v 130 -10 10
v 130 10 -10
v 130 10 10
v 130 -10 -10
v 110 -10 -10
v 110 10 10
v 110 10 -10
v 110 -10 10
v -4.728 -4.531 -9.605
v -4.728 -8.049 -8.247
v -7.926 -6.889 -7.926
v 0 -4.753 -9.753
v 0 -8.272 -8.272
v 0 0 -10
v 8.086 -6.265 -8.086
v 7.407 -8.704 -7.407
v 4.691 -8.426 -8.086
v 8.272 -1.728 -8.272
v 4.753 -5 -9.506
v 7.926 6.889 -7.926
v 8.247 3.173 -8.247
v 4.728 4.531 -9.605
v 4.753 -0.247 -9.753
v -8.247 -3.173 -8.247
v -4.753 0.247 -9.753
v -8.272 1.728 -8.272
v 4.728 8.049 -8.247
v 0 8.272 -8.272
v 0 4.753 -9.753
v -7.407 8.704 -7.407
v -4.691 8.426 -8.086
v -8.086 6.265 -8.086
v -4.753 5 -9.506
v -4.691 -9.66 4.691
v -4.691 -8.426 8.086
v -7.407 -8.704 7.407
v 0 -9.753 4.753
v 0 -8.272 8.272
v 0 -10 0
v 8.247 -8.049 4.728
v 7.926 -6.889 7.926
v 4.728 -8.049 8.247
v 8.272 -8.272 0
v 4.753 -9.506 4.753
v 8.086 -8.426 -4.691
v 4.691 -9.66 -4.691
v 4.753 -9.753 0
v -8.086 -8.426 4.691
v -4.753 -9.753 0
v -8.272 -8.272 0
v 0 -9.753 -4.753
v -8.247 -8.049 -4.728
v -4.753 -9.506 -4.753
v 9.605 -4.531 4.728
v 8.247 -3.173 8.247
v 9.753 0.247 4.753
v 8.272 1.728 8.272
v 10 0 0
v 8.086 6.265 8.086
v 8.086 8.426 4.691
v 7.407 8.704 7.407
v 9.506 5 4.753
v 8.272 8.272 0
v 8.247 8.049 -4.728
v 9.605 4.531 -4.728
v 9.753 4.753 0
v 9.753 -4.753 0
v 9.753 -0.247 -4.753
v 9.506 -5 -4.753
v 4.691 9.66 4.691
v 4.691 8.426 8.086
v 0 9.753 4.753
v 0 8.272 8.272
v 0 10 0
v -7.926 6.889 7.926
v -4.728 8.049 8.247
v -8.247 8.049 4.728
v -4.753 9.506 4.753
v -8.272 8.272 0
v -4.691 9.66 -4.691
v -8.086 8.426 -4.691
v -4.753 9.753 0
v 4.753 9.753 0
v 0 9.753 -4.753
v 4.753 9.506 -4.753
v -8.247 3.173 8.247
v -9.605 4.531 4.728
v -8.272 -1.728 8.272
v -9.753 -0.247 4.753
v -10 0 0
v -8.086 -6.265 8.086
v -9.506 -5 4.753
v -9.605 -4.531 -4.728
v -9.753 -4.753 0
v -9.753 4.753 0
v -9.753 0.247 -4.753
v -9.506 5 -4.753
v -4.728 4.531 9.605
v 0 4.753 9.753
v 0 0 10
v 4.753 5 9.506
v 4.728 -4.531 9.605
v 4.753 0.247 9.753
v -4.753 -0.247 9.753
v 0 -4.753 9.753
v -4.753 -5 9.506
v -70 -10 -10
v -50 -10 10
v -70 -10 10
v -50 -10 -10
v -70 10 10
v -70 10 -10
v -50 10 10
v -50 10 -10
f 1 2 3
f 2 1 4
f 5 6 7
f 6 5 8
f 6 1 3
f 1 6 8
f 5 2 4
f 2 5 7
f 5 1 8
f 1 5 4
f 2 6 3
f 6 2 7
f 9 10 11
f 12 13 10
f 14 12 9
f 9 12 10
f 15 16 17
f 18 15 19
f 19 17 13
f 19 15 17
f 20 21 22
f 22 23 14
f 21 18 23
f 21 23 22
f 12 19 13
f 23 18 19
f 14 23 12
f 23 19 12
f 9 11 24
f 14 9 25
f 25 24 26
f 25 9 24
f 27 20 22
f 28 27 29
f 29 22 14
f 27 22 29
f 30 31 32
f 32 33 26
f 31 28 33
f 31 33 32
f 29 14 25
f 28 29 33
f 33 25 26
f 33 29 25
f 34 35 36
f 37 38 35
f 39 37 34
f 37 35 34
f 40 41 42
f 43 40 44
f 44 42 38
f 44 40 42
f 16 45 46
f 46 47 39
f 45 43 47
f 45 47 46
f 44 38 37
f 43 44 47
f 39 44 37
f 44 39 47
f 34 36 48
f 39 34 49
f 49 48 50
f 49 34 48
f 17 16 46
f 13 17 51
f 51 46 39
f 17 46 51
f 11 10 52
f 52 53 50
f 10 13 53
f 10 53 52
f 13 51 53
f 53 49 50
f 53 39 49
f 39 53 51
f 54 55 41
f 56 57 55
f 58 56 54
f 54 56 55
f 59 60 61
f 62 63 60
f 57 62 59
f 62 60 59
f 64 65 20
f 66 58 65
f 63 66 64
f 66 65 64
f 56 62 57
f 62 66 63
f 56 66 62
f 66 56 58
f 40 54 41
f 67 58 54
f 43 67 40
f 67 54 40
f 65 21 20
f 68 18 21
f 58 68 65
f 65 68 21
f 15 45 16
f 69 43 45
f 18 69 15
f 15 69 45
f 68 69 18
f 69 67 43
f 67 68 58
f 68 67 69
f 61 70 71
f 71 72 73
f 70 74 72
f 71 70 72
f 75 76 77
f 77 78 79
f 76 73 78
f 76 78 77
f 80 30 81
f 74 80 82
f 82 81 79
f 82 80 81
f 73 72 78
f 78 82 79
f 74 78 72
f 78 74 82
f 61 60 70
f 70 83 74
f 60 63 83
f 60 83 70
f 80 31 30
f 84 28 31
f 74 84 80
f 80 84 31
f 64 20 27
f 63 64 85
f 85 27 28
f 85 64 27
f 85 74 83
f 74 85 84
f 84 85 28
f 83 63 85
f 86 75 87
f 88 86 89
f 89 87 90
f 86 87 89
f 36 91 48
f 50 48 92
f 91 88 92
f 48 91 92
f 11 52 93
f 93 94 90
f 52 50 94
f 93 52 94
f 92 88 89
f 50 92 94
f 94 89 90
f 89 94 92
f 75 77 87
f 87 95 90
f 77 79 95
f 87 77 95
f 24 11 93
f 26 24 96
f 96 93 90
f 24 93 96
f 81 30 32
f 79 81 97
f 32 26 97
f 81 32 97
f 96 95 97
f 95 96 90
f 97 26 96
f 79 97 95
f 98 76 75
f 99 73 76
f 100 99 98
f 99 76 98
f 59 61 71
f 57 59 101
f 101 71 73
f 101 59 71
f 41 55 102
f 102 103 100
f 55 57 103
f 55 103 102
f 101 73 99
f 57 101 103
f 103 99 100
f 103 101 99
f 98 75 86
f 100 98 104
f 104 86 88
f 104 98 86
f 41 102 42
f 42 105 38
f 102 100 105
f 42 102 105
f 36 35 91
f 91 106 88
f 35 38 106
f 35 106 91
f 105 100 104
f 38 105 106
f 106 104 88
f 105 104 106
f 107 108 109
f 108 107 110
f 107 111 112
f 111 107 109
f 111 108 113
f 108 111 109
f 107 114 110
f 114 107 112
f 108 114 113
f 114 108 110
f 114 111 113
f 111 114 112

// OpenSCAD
//demo mesh
Flat_treshold=0.009;
  //mesh=trimesh(cubemesh4() );
mesh=trimesh(cubemesh3() );
  //  mesh= (diamond() );

 // mesh=fp_flip(bunny());

echo(len(  mesh[0]),len(mesh[1]));

midmesh =  ( tesselate(fusepoints(mesh),2)) ;
 dmaesh= fp_decimate( midmesh );
 //nm = fp_decimate (tesselate(dmaesh,0));


 newmesh=relax (midmesh);
translate ([120,0,0]) polyhedron(midmesh[0], midmesh[1]);

// translate ([60,0,0]) polyhedron(nm[0], nm[1]);
translate ([ 0,0,0]) polyhedron(newmesh[0], newmesh[1]);

translate ([-60,0,0]) polyhedron(dmaesh[0], dmaesh[1]);
  // for (i = [0: len(newmesh) - 1]) echo(newmesh[i]);
echo(len( midmesh[0]),len(dmaesh[0]));
echo(len( dmaesh[0]),len(dmaesh[0]));


function fp_decimate (m,i=0,changed=0 ,nn=0)=
let(points=m[0],faces=m[1],n=neighbours(m) )
i<len(points)-1?
let(
removies=[for(k=[0:max(0,len(n[i])-1)]) faces[n[i][k]]],
 r=flattness(m,removies) 
//, e=echo(i,"removies",removies,"flattness",r)
)

r<=Flat_treshold? 
let(
newm=fp_decimateinidex(m,i,removies),
newch=len(newm[0])==len(m[0])?changed:changed+1,
newi=len(newm[0])==len(m[0])?i  :i
)
fp_decimate (newm,newi,newch,n ) 
:fp_decimate (m,i+1,changed ,n)
:
changed>0?

 fp_decimate( m)
:
fusepoints(m)

;

/*needs change*/

function fp_decimateinidex(m,j,n)=
let( points=m[0],faces=m[1])
let(
removies=n,
newfaces=fp_removevertex(m,removies,j,alt=3),
r= flattness(m,newfaces),
h= flattness(m,removies)

) 
r<=h?
    let(nn=notneighboursofi (m,j),keepers= [for(k=[0:len(nn)-1]) faces[nn[k]]]
 //, e=echo("n",removies,"j",keepers)
)
    [points, concat(keepers,newfaces)]
    :
m
;
function fp_removevertex(m,removies,vertex,alt=0)=
let(points=m[0] )
let(

n= avrg([for(i=[0:max(0,len(removies)-1)])
p2n(  [points[removies[i][0]], points[removies[i][1]], points[removies[i][2]]])    ] ),


d= fp_tricylceb(removies,vertex),
c= fp_segorder(d),
e=fp_segcollapse(c),
g=shuffle(e,alt-round(rnd(2))),
f=fp_triangulate(m,g,n)
//,eco=echo( len(d),len(c))
)
 len(removies)>2&&len(c)==len(d)&&len(f)+2==len(removies)?f: removies 
;
function flattness(m,n)=

let(points=m[0],faces=m[1], 

normals=[for(i=[0:max(0,len(n)-1)])p2n(
 [
//let(e=echo("normals",n))
points[n[i][0]],
points[n[i][1]],
points[n[i][2]] 
])

],
ne=normeq(normals)



)  

ne
;


/*needs change*/

function newflattness(m)=

let(points=m[0],faces=m[1],

normals=[for(i=[0:max(0,len(m)-1)])p2n(m[i])

],
ne=normeq(normals)


) 
ne
;
function fp_glue(m)= let (
   hashed = fp_addhash(fp_flatten(m)), /*flatten and pair points with hash*/
   sorted = fp_hashQS(hashed),/*sort by hash*/
   unique = fp_unique(sorted),/*unique by hash*/
   newmesh = [fp_removehash(unique), fp_relink(unique, m)])/* combine to new mesh*/
 newmesh;
 function fusepoints(m) =
 let (
   privatetized = fp_privatetize(m), /* convert indexed polyhedron */
 newmesh= fp_glue(privatetized))
 newmesh;

 function fp_privatetize(m) = 
/* convert indexed polyhedron to vetrtex polygons with private vertex*/
 let (p = m[0], f = m[1], l = max(0,len(f) - 1))[
   for (i = [0: l])[     for (j = [0: len(f[i]) - 1]) p[f[i][j]]   ]];

 function fp_flatten(l) = [   for (a = l)     for (b = a) b ];
 
 function fp_addhash(m) = 
/*pair each point with a hash of the point*/
[   for (i = [0: len(m) - 1])[fp_encode(m[i]), m[i]] ];

 function fp_encode(v) =
 let (xseed = round(fp_rnd(1e8, -1e8, round(v.x * 1e6))),
   yseed = round(fp_rnd(1e8, -1e8, xseed + round(v.y * 1e6))),
   zseed = round(fp_rnd(1e8, -1e8, yseed + round(v.z * 1e6))),
   hash =   round(fp_rnd(1e8, -1e8, zseed)))
 hash;

 function fp_hashQS(arr) = !(len(arr) > 0) ? [] :
 let (pivot = arr[floor(len(arr) / 2)][0],
 lesser = [ for (y = [0: len(arr) - 1]) if (arr[y][0] < pivot) arr[y] ],
 equal = [ for (y = [0: len(arr) - 1]) if (arr[y][0] == pivot) arr[y] ],
 greater = [ for (y = [0: len(arr) - 1]) if (arr[y][0] > pivot) arr[y] ])
 concat(fp_hashQS(lesser), equal, fp_hashQS(greater));

 function fp_unique(m) = [   for (i = [0: len(m) - 1])     if (m[i] != m[i - 1]) m[i] ];

 function fp_rnd(a = 1, b = 0, s = []) = s == [] ? (rands(min(a, b), max(   a, b), 1)[0]) : (rands(min(a, b), max(a, b), 1, s)[0]); 

 function fp_removehash(m) = [   for (i = [0: len(m) - 1]) m[i][1] ];
 function fp_relink(p, f) =
/*convert polygons with private vertex to indexed by searching for hash matches  */
 let (l = len(f) - 1)[   for (i = [0: l])[     for (j = [0: len(f[i]) - 1]) search(fp_encode(f[i][j]), p)[0]] ];
 
 function fp_flip(w)=[w[0],[for(i=[0:len(w[1])-1])[w[1][i][0],w[1][i][2],w[1][i][1]]]];

function lerp(start, end, bias) = (end * bias + start * (1 - bias));

function relax(m, c =  2,nn=0) = 
let(points=m[0], faces=m[1], n=nn==0?neighbours(m):nn)
c > 0 ?
let(
midpoints = 
[ for (i = [0: len(faces) - 1]) avrg( 
[points[faces[i][0]], points[faces[i][1]], points[faces[i][2]]]
) ], 

points2 = [ for (i = [0: len(points) - 1]) len(
n[i]) > 0 ?  avrg([ for (j = [0: len(n[i]) - 1]) midpoints[ n[i] [j]]
 ])  : points[i] ])

relax([points2, faces]  , c - 1,n)
:
 [points, faces];

function neighbours (m)=let(points=m[0],faces=m[1]) [ for (i = [0: len(points) - 1])[ for (j = [0: len(faces) - 1])
 if (faces[j][0] == i || faces[j][1] == i || faces[j][2] == i || faces[j][3] == i) j] ];
function notneighbours (m)=let(points=m[0],faces=m[1]) [ for (i = [0: len(points) - 1])[ for (j = [0: len(faces) - 1])
 if ( (faces[j][0] != i && faces[j][1] != i && faces[j][2] != i && faces[j][3] != i)) j] ];
function neighboursofi (m,i)=let(points=m[0],faces=m[1])
  [ for (j = [0: len(faces) - 1])
 if (faces[j][0] == i || faces[j][1] == i || faces[j][2] == i || faces[j][3] == i) j] ;
function notneighboursofi (m,i)=let(points=m[0],faces=m[1])
  [ for (j = [0: len(faces) - 1])
 if ( (faces[j][0] != i && faces[j][1] != i && faces[j][2] != i && faces[j][3] != i)) j] ;
function addl(l, c = 0) = c < len(l) - 1 ? l[c] + addl(l, c + 1) : l[
 c];
function avrg(l) = len(l) > 1 ? addl(l) / (len(l)) : l;




function shuffle(b,l=1)=let(
c=concat( [for(i=[1:len(b)-1])b[i]],[b[0]]))
l>0?shuffle(c,l-1):c
;
function fp_tricylceb(b,p)=[for(i=[0:len(b)-1])fp_tricycle (b[i],p)];

function fp_tricycle(f,p)=
fp_is_equal(f[0],p)?
[f[1],f[2]]:
     let(f1=[f[1],f[2],f[0]])
    fp_is_equal(f1[0],p)?
        [f1[1],f1[2]]:
        let(f2=[f1[1],f1[2],f1[0]])
        fp_is_equal(f2[0],p)?[f2[1],f2[2]]:
        f;

function fp_triangulate(m,a,n ,count=0)=
let(points=m[0],faces=m[1])
count>len(a)?
a
:
len(a)<=3?
[[a[0],a[1],a[2]]]:
sign(dot(p2n([points[a[0]],points[a[1]],points[a[2]]  ]),n))>0?
let(b=concat([for(i=[2:len(a)-1])a[i]],[a[0]] )) 
concat([[a[0],a[1],a[2]]],fp_triangulate( m,shuffle(b,2),n )):fp_triangulate(m, shuffle(a,1),n,count+1 );

function fp_trimeshulate(a)=len(a)>3?let(b=concat([for(i=[2:len(a)-1])a[i]],[a[0]] )
) concat([[a[0],a[1],a[2]]],fp_trimeshulate(shuffle(b,2))):[[a[0],a[1],a[2]]];



 function fp_is_equal(a, b, d=1e-16) = (a==b) || (abs(a-b)<d) || (norm(a-b)<d);
    function flatten(l) = [ for (li = l, lij = li) lij ];

function rnd(a = 1, b = 0) = (rands(min(a, b), max(a, b), 1)[0]);

 function fp_segorder(n,acc=0,c=0)=c<=len(n)-1?let(newacc= (acc==0)?[n[0]]:let(lookfor= acc[0][0]) concat([for(i=[0:len(n)-1])if(fp_is_equal(lookfor,n[i][1])==true)n[i]],acc ))fp_segorder(n,newacc,c+1):acc;

function fp_segcollapse(n)=
[for(i=[0:len(n)-1])n[i][0]];

function normeq(pl) = 

let (list= [
 for (i = [0: len(pl) - 1],j = [0: len(pl) - 1])
 
 (-1 + dot(pl[i], pl[j])  )
   ]
,
sums = avrg(list) )
 
abs(sums)
 ;

function p2n4(p) =un(p2n(p0,p1,p3)+p2n(p3,p1,p2));
function p2n(p) =
let (pa=p[0], pb=p[1], pc=p[2],
u = pa - pb, v = pa - pc) un([u[1] * v[2] - u[2] * v[1], u[2] *
 v[0] - u[0] * v[2], u[0] * v[1] - u[1] * v[0]
]);
function un(v) = v / max(len3(v), 0.000001) * 1; // div by zero safe unit normal
function dot(v1, v2) = v1[0] * v2[0] + v1[1] * v2[1] + v1[2] * v2[2];
function addl(l, c = 0) = c < len(l) - 1 ? l[c] + addl(l, c + 1) : l[
 c];
function len3(v) = len(v) > 1 ? sqrt(addl([
 for (i = [0: len(v) - 1]) pow(v[i], 2)
])) : len(v) == 1 ? v[0] : v;

function  trimesh (t)=
let(
t1=t[1],
t2=fp_flatten([for(i=[0:len(t1)-1]) 
 (len( t1[i])==3)?[t1[i]]:[[t1[i][0],t1[i][1],t1[i][2]],[t1[i][0],t1[i][2],t1[i][3]]]     ] )
)[t[0],t2]
;
function tesselate(m,c=1)=
c>=1?
 let (
   pr = fp_privatetize(m), /* convert indexed polyhedron */

 subdv=fp_flatten([for(i=[0:max(0,len(pr)-1)])let(
pr01=lerp(pr[i][0],pr[i][1],0.5),
pr12=lerp(pr[i][1],pr[i][2],0.5),
pr20=lerp(pr[i][2],pr[i][0],0.5)
)[
[pr[i][0],pr01,pr20],
[pr[i][1],pr12,pr01],
[pr[i][2],pr20,pr12],
[pr01,pr12,pr20]

]
]),
 
  newmesh =   fp_glue(subdv)
)
tesselate(newmesh,c-1)
:

m;
 

module trender(t) {
 C0 = (un(rndc()) + [2, 0, 0]);
 C1 = (un(rndc()) + [2, 2, 0]);
 C2 = (un(rndc()) + [0, 2, 2]);
 for (i = [0: max(0, len(t[1]) - 1)]) {
 n = un(p2n(t[0][t[1][i][0]], t[0]
 [t[1][i][1]], t[0][t[1][i][
 2
 ]]));
 color(un((C0 * abs(n[0]) + C1 * abs(n[1]) + C2 * abs(n[2]) + [
 1, 1, 1
 ] * abs(n[2])) / 4)) polyhedron(t[0], [t[1][i]]);
 }
}
function rndc(a = 1, b = 0,seed) = [rnd(a, b,seed),
 rnd(a, b,seed+1), rnd(a, b,seed+2)
];
function bunny()=[[[33.718,-8.247,33.616],[-30.065,-22.111,41.454],[1.142,14.457,35.998],[20.205,-17.34,49.075],[36.378,-2.827,7.022],[-11.251,13.5,5.136],[29.105,-18.728,7.239],[-9.845,8.083,9.951],[-36.86,-24.079,60.289],[-28.976,-3.302,3.436],[-11.413,-13.526,50.148],[28.736,-0.816,42.915],[-32.116,4.195,42.182],[29.812,-7.088,2.935],[-37.993,-15.409,34.838],[-28.78,-18.857,66.373],[-29.289,21.548,77.615],[-28.191,23.665,69.162],[-36.226,-11.242,66.87],[31.967,2.895,30.506],[-25.318,1.605,64.068],[-41.72,-13.563,47.396],[3.505,-27.667,8.246],[18.251,9.502,40.482],[-40.705,-8.309,57.649],[-34.759,-14.864,24.435],[41.326,-8.903,12.497],[7.937,-25.727,1.639],[0.142,18.861,18.906],[37.372,0.543,12.665],[11.469,-25.566,39.178],[-11.3,-25.322,6.98],[16.983,0.961,50.904],[25.417,10.084,22.882],[12.196,16.124,13.812],[-38.798,-23.136,44.566],[-6.906,16.568,23.283],[-11.406,5.707,70.997],[27.876,3.576,10.072],[-29.124,6.104,23.795],[30.252,-19.533,18.403],[-24.95,-3.186,68.402],[-21.5,4.288,1.733],[-20.217,0.035,59.846],[-16.111,-1.157,53.825],[9.791,18.388,28.806],[-20.449,-9.927,10.118],[-5.697,-29.44,3.937],[-14.075,-24.543,1.192],[-38.314,-4.065,30.749],[-17.348,-6.564,61.51],[39.723,-14.873,17.026],[-24.142,-11.883,1.318],[4.044,-18.973,49.654],[-25.128,-21.576,4.037],[28.884,-15.239,42.197],[-7.042,-23.574,16.146],[-22.782,1.057,13.904],[-30.957,-28.833,46.933],[-13.723,10.348,24.112],[-6.4,7,79.935],[0.38,8.58,73.547],[-2.751,-29.774,24.603],[32.871,-16.125,29.207],[-3.623,17.983,31.576],[17.513,4.686,2.883],[-30.017,-27.275,56.561],[13.323,-29.14,13.068],[-20.244,-21.378,18.476],[-20.735,-20.229,49.671],[34.577,-0.469,19.663],[-32.728,2.082,59.206],[1.448,8.004,45.899],[-21.1,-24.65,32.38],[-3.299,14.822,3.265],[37.681,-9.851,21.953],[10.732,-31.947,27.781],[-25.458,13.814,68.264],[14.963,11.754,4.948],[-21.548,-8.801,67.863],[2.005,-5.173,1.969],[-23.472,3.741,51.505],[21.968,-9.013,50.599],[-9.451,7.934,17.546],[41.184,-5.284,20.179],[-39.539,-2.907,46.751],[-39.019,-9.922,42.553],[-16.487,10.221,37.797],[-9.537,-0.368,72.53],[-13.553,-22.428,41.139],[-5.875,-25.824,33.532],[10.433,-17.548,2.653],[-40.968,-17.45,57.613],[-32.842,15.053,71.785],[-4.31,-4.034,51.575],[10.947,-7.696,54.207],[1.296,-30.04,33.917],[-33.833,1.324,66.787],[-27.494,-6.782,16.239],[-21.944,-17.558,61.153],[-38.475,-27.624,50.311],[24.879,-24.385,33.536],[-21.259,-16.919,7.059],[-21.259,-16.919,7.059],[-21.259,-16.919,7.059]],[[80,91,48],[27,48,91],[68,98,46],[48,52,80],[98,25,49],[54,52,48],[42,74,80],[52,42,80],[42,5,74],[6,13,26],[25,98,68],[9,42,52],[46,103,68],[58,35,1],[1,35,21],[80,74,65],[100,35,58],[80,65,13],[91,80,13],[27,91,6],[6,91,13],[47,48,27],[51,75,40],[87,59,39],[5,7,74],[2,72,23],[28,74,7],[54,104,52],[64,28,36],[60,61,37],[39,57,98],[64,45,28],[34,74,28],[31,48,47],[102,54,31],[7,42,57],[59,57,39],[12,81,87],[37,43,41],[2,45,64],[74,34,78],[41,43,20],[59,7,57],[28,45,34],[87,39,12],[45,33,34],[37,41,60],[12,71,81],[34,33,78],[72,2,87],[38,29,65],[65,29,4],[49,12,39],[50,79,99],[94,72,44],[23,11,19],[27,6,67],[72,81,44],[44,81,43],[87,81,72],[70,75,84],[43,81,20],[45,2,23],[29,70,84],[19,33,23],[33,45,23],[32,72,94],[83,7,59],[98,57,46],[57,9,46],[71,85,24],[97,71,24],[97,93,71],[85,12,49],[49,39,98],[9,57,42],[32,94,95],[23,72,32],[71,93,17],[18,24,92],[5,42,7],[86,1,21],[83,59,36],[83,36,7],[36,28,7],[64,36,59],[23,32,11],[93,16,17],[12,85,71],[18,8,15],[92,35,100],[87,2,59],[22,62,56],[9,52,46],[8,92,100],[90,62,96],[14,1,86],[93,97,16],[14,25,73],[25,68,73],[1,14,73],[16,77,17],[30,90,96],[2,64,59],[8,100,66],[77,71,17],[32,82,11],[41,79,60],[15,79,41],[3,55,82],[82,55,11],[10,94,44],[44,50,10],[20,77,16],[79,88,60],[20,71,77],[99,69,10],[21,92,24],[50,99,10],[16,41,20],[8,18,92],[97,41,16],[22,27,67],[51,84,75],[15,66,99],[97,18,41],[55,0,11],[4,26,13],[55,63,0],[70,38,33],[102,46,52],[14,49,25],[75,0,63],[74,78,65],[19,70,33],[38,65,78],[33,38,78],[86,85,49],[97,24,18],[65,4,13],[86,49,14],[70,29,38],[50,61,88],[6,26,51],[37,61,43],[30,76,101],[40,101,67],[101,76,67],[30,101,3],[101,40,63],[55,3,101],[40,75,63],[22,47,27],[67,6,40],[60,88,61],[43,50,44],[19,11,0],[63,55,101],[26,4,29],[84,26,29],[31,54,48],[69,99,66],[58,1,69],[69,66,58],[76,62,67],[3,53,30],[67,62,22],[43,61,50],[30,96,76],[96,62,76],[22,31,47],[53,89,30],[89,90,30],[95,3,82],[56,31,22],[95,53,3],[10,89,53],[90,56,62],[90,73,56],[40,6,51],[89,73,90],[21,85,86],[56,68,31],[0,75,70],[73,68,56],[69,89,10],[68,102,31],[84,51,26],[15,41,18],[89,69,1],[1,73,89],[92,21,35],[82,32,95],[24,85,21],[0,70,19],[71,20,81],[8,66,15],[79,50,88],[66,100,58],[94,53,95],[15,99,79],[10,53,94]]];


function diamond()=



[[[-4.10863, -0.140602, -3.6055], [-3.84601, -3.60175, -1.47346], [-3.97796, -4.24691, -0.613285], [-2.53813, -0.848251, -6.37256], [-2.18844, -1.82373, -4.13948], [-0.0333337, -0.848251, -6.37256], [-0.107152, -1.93214, -3.8401], [-1.97693, -1.14585, -5.02233], [-0.274562, -1.22818, -4.66476], [-3.44904, -3.49388, -1.8379], [-2.53813, -6.1872, 0.213072], [-0.037514, -3.74431, -1.36103], [1.90021, -5.55326, 1.49797], [-2.17048, -4.75789, 0.0422999], [0.38598, -5.22305, 0.760223], [-4.55809, -2.31577, -1.67114], [-6.44044, -0.0759498, -0.538324], [-6.32277, -1.73312, 0.916171], [-5.9166, -0.0467461, -1.88034], [-5.65828, -2.40612, -0.340622], [-6.96031, -0.89379, 0.448986], [-6.65543, -1.13852, -0.358017], [-2.88119, -2.59327, -3.09619], [-0.0989006, -2.70754, -2.83311], [-3.60055, -1.31693, -3.26812], [-2.53813, -2.6279, 0.213072], [-0.0333337, -0.848251, -1.98214], [-0.0333337, -2.6279, 0.213072], [2.15047, -1.95664, -3.656], [3.80216, -1.72573, -3.28922], [1.56304, -1.48258, -4.06836], [3.83668, -0.578218, -3.60172], [2.68802, -3.77158, -1.23882], [2.83805, -5.71606, 1.54781], [5.02919, -3.92323, -0.983753], [3.92337, -5.44133, 1.27551], [2.72541, -4.80807, 0.236576], [5.02994, -4.6583, 0.245474], [7.48106, -0.848251, -4.17735], [7.48106, -4.40755, -1.98214], [6.60705, -3.53789, 1.16426], [2.83029, -2.38095, -3.21484], [5.84927, -2.95745, -2.39152], [2.47146, -0.848251, -1.98214], [2.47146, -2.6279, 0.213072], [6.11744, -0.664958, -2.92074], [6.43254, -3.13239, -0.469602], [7.22257, -2.26381, -1.08929], [6.65182, -0.574654, -2.63706], [8.58868, -1.57387, 0.498089], [9.98586, -2.6279, 0.213072], [8.86667, -0.790335, 0.374336], [8.84603, -0.149826, 1.18825], [-4.87593, 1.50124, -3.97146], [-4.70862, 2.29828, -4.04328], [-2.53813, 0.931399, -6.37256], [-0.0333337, 0.931399, -6.37256], [-2.53813, 2.71105, -6.37256], [-1.92777, -0.992021, -5.03321], [-0.0333337, 2.71105, -6.37256], [-0.995141, 0.58903, -5.22706], [-2.83857, 2.64671, -4.83497], [-0.750299, 2.94568, -5.55327], [-4.06563, 3.93282, -3.18426], [-6.40319, 0.425744, -0.412854], [-5.75953, 0.527687, -2.25537], [-6.99193, 0.969201, 1.4556], [-5.02031, 3.91375, -2.41588], [-6.36916, 1.93535, 0.391189], [-7.54773, 2.71105, 0.213072], [-5.83043, 2.72602, -0.366366], [-0.0333337, 4.4907, -6.37256], [-2.95489, 4.38504, -3.58535], [-0.877111, 5.02743, -4.1213], [-2.53813, 6.27035, -4.17735], [-0.0333337, 6.27035, -4.17735], [-4.76143, 4.15636, -2.33779], [-4.16403, 4.15885, 0.111998], [-3.22708, 5.14215, -0.9632], [-1.14664, 5.60559, -1.71968], [-1.66131, 5.80306, -0.514935], [-2.62796, 5.5636, 0.410056], [-1.52977, 5.81804, -0.660227], [-0.446236, 5.67479, 0.418208], [-1.75275, 5.8585, -0.193377], [-1.41853, 5.85982, -0.269016], [-4.54762, -3.75071, 3.14745], [-3.71454, -3.78975, 3.72922], [-2.53813, -6.1872, 2.40828], [1.95471, -5.51812, 2.02936], [-1.98562, -4.49762, 2.43775], [0.605838, -5.10006, 2.73186], [-0.0333337, -6.1872, 4.60349], [-2.1796, -4.16354, 4.20972], [0.220772, -4.657, 5.04817], [-6.28168, -1.83123, 1.66813], [-5.33131, -3.05158, 3.25984], [-6.7583, -0.821015, 1.81635], [-6.00906, -0.691373, 3.23509], [-5.01305, -2.50056, 4.10666], [-7.54773, -0.848251, 4.60349], [-5.05032, -1.18996, 4.9624], [-2.53813, -2.6279, 2.40828], [-2.13919, -2.76434, 5.27905], [-0.478659, -3.32594, 5.65739], [-2.8572, -1.53707, 5.73698], [-0.0333337, -0.848251, 4.60349], [1.40225, -3.9013, 6.19035], [-5.04293, -0.848251, 6.7987], [-0.907379, -2.11602, 6.31779], [0.598011, -2.49364, 6.82502], [-1.09261, -1.85583, 6.29929], [0.925692, -0.912368, 6.68243], [2.47146, 2.71105, -6.37256], [1.57593, 0.832456, -4.50757], [3.86489, 1.76097, -4.05165], [1.83142, 2.49517, -4.66334], [3.50857, 2.16194, -4.07357], [7.48106, 0.931399, -4.17735], [7.48106, 2.71105, -4.17735], [0.927679, 4.60082, -3.54521], [4.97626, 4.4907, -4.17735], [5.60468, 1.48375, -3.48449], [3.02465, 3.60509, -3.20588], [4.69642, 3.79178, -2.32503], [4.97626, 2.71105, 0.213072], [7.28769, 1.33692, -2.80066], [7.10103, 3.30374, -1.62038], [8.91038, 0.594316, 0.471455], [8.79874, 0.177289, 1.19532], [7.25544, 3.28327, -1.09866], [9.98586, 2.71105, 0.213072], [2.38489, 4.5449, -2.73796], [4.94993, 4.02157, -1.7848], [2.47146, 6.27035, -1.98214], [2.25305, 5.13412, 1.26447], [5.98923, 4.14473, 0.694604], [2.47146, 6.27035, 0.213072], [4.97626, 6.27035, 0.213072], [6.10839, 3.74254, -1.03395], [6.44784, 3.85258, 0.124204], [3.63356, -5.93983, 1.99458], [4.29407, -5.80738, 1.96402], [2.1521, -5.36055, 3.48979], [3.60251, -5.58484, 3.54027], [4.63112, -5.61119, 1.90199], [4.43858, -5.3304, 3.31399], [2.56493, -5.20374, 5.66859], [6.64743, -4.16945, 4.61148], [6.58158, -3.88963, 2.51602], [6.69287, -4.22084, 4.47167], [4.97626, -2.6279, 2.40828], [6.20177, -3.5936, 5.36913], [6.10459, 0.186099, 5.5842], [2.47146, -6.1872, 6.7987], [3.07735, -4.60228, 6.48149], [4.68258, -4.24091, 5.85724], [7.82046, -2.66139, 2.57944], [8.30424, -0.773894, 2.36074], [6.92055, -3.89612, 4.68602], [8.72116, -0.105558, 1.58722], [7.42911, -0.759798, 4.85241], [2.83186, -2.96797, 7.53465], [5.33017, -2.67575, 6.59174], [3.03607, -0.677601, 7.2506], [2.47146, -2.6279, 8.99391], [5.45436, -0.369361, 6.53547], [2.47146, -0.848251, 8.99391], [6.58971, -2.335, 6.0984], [6.71974, -1.44671, 6.08463], [-7.01509, 0.965476, 1.33196], [-5.93065, 1.78085, 2.42897], [-7.54773, 2.71105, 2.40828], [-4.25257, 3.10903, 3.81421], [-4.43171, 1.05919, 4.67493], [-3.97833, 2.70613, 4.44912], [-3.54766, 3.65164, 3.31828], [-2.1615, 0.698256, 5.44592], [-1.45723, 3.44114, 3.69473], [-0.612926, 1.46768, 5.68235], [-2.62304, 2.53125, 4.88518], [-0.354467, 2.18707, 5.50257], [-3.87248, 3.96791, 1.69684], [-5.04293, 4.4907, 4.60349], [-3.00649, 4.61703, 2.02873], [-0.272702, 4.3237, 2.4991], [-2.53813, 6.27035, 2.40828], [-2.53813, 4.4907, 4.60349], [-0.0333337, 6.27035, 2.40828], [0.867876, 3.48696, 3.71022], [-0.81646, -0.0217327, 5.9989], [0.883914, 1.53673, 6.15091], [-2.53813, 2.71105, 6.7987], [1.23386, 1.82958, 5.98969], [2.47146, 2.71105, 2.40828], [2.47146, 0.931399, 4.60349], [5.95758, 3.73293, 3.30952], [5.1154, 1.90952, 5.45984], [2.52823, 2.7118, 4.86052], [5.17682, 2.81784, 4.6537], [8.6324, 1.13685, 2.31573], [8.73021, 0.22765, 1.5864], [7.20341, 2.796, 2.56305], [7.80901, 0.297881, 3.82064], [6.6867, 2.07576, 3.69413], [2.85691, 4.93536, 1.7438], [5.42898, 4.50011, 2.37199], [2.47146, 6.27035, 2.40828], [2.57168, 3.62621, 3.54726], [4.97626, 6.27035, 2.40828], [4.18949, 3.69698, 3.4517], [3.26533, 1.08488, 7.0259], [4.41927, 1.24853, 6.66006], [2.66961, 1.95828, 5.88189], [3.93665, 1.97327, 5.74871], [6.38898, 3.73076, 1.44543]], [[19, 2, 1], [19, 1, 15], [21, 19, 15], [21, 15, 18], [24, 22, 4], [24, 4, 7], [31, 29, 42], [31, 42, 45], [42, 34, 37], [42, 37, 46], [48, 47, 49], [48, 49, 51], [65, 18, 0], [65, 0, 53], [66, 20, 16], [66, 16, 64], [67, 65, 53], [67, 53, 54], [70, 68, 65], [70, 65, 67], [76, 67, 54], [76, 54, 63], [77, 70, 67], [77, 67, 76], [84, 81, 78], [84, 78, 80], [82, 79, 83], [82, 83, 85], [91, 89, 12], [91, 12, 14], [96, 86, 2], [96, 2, 19], [97, 95, 17], [97, 17, 20], [99, 87, 86], [99, 86, 96], [101, 99, 96], [101, 96, 98], [110, 107, 94], [110, 94, 104], [111, 109, 103], [111, 103, 105], [115, 31, 45], [115, 45, 122], [117, 115, 122], [117, 122, 124], [126, 48, 51], [126, 51, 128], [127, 126, 128], [127, 128, 130], [120, 116, 123], [120, 123, 132], [139, 127, 130], [139, 130, 140], [37, 35, 142], [37, 142, 145], [147, 144, 141], [147, 141, 143], [145, 142, 146], [145, 146, 148], [49, 40, 149], [49, 149, 157], [51, 49, 157], [51, 157, 158], [157, 149, 150], [157, 150, 159], [158, 157, 159], [158, 159, 161], [152, 148, 156], [152, 156, 163], [161, 159, 168], [161, 168, 169], [170, 97, 20], [170, 20, 66], [173, 171, 68], [173, 68, 70], [174, 101, 98], [174, 98, 171], [175, 174, 171], [175, 171, 173], [182, 173, 70], [182, 70, 77], [189, 181, 178], [189, 178, 185], [190, 111, 105], [190, 105, 177], [193, 191, 179], [193, 179, 181], [129, 52, 160], [129, 160, 201], [130, 128, 200], [130, 200, 202], [200, 158, 161], [200, 161, 203], [202, 200, 203], [202, 203, 204], [206, 196, 199], [206, 199, 210], [197, 153, 166], [197, 166, 212], [199, 197, 212], [199, 212, 214], [140, 130, 202], [140, 202, 215], [9, 1, 2], [9, 2, 13], [11, 9, 13], [11, 13, 14], [18, 16, 20], [18, 20, 21], [6, 4, 22], [6, 22, 23], [7, 0, 18], [7, 18, 24], [32, 11, 14], [32, 14, 36], [34, 32, 36], [34, 36, 37], [28, 6, 23], [28, 23, 41], [29, 28, 41], [29, 41, 42], [47, 42, 46], [47, 46, 49], [68, 66, 64], [68, 64, 65], [78, 76, 63], [78, 63, 72], [79, 78, 72], [79, 72, 73], [81, 77, 76], [81, 76, 78], [85, 84, 80], [85, 80, 82], [13, 2, 86], [13, 86, 90], [14, 13, 90], [14, 90, 91], [90, 86, 87], [90, 87, 93], [91, 90, 93], [91, 93, 94], [19, 17, 95], [19, 95, 96], [104, 103, 109], [104, 109, 110], [124, 123, 116], [124, 116, 117], [132, 79, 73], [132, 73, 120], [135, 83, 79], [135, 79, 132], [136, 135, 132], [136, 132, 133], [140, 136, 133], [140, 133, 139], [33, 12, 89], [33, 89, 141], [35, 33, 141], [35, 141, 142], [142, 141, 144], [142, 144, 146], [143, 91, 94], [143, 94, 147], [40, 37, 145], [40, 145, 149], [149, 145, 148], [149, 148, 150], [147, 94, 107], [147, 107, 155], [148, 147, 155], [148, 155, 156], [52, 51, 158], [52, 158, 160], [159, 152, 163], [159, 163, 168], [169, 166, 153], [169, 153, 161], [171, 170, 66], [171, 66, 68], [180, 175, 173], [180, 173, 176], [181, 180, 176], [181, 176, 178], [184, 182, 77], [184, 77, 81], [185, 184, 81], [185, 81, 83], [191, 190, 177], [191, 177, 179], [201, 200, 128], [201, 128, 129], [204, 199, 196], [204, 196, 202], [205, 185, 83], [205, 83, 135], [206, 205, 135], [206, 135, 136], [208, 189, 185], [208, 185, 205], [210, 208, 205], [210, 205, 206], [213, 193, 181], [213, 181, 198], [214, 213, 198], [214, 198, 199], [215, 206, 136], [215, 136, 140], [7, 4, 6], [7, 6, 8], [20, 17, 19], [20, 19, 21], [15, 1, 9], [15, 9, 22], [22, 9, 11], [22, 11, 23], [18, 15, 22], [18, 22, 24], [8, 6, 28], [8, 28, 30], [30, 28, 29], [30, 29, 31], [14, 12, 33], [14, 33, 36], [36, 33, 35], [36, 35, 37], [23, 11, 32], [23, 32, 41], [41, 32, 34], [41, 34, 42], [45, 42, 47], [45, 47, 48], [46, 37, 40], [46, 40, 49], [53, 0, 7], [53, 7, 58], [58, 7, 8], [58, 8, 60], [54, 53, 58], [54, 58, 61], [61, 58, 60], [61, 60, 62], [64, 16, 18], [64, 18, 65], [63, 54, 61], [63, 61, 72], [72, 61, 62], [72, 62, 73], [80, 78, 79], [80, 79, 82], [85, 83, 81], [85, 81, 84], [98, 96, 95], [98, 95, 97], [103, 93, 87], [103, 87, 99], [104, 94, 93], [104, 93, 103], [105, 103, 99], [105, 99, 101], [112, 110, 109], [112, 109, 111], [60, 8, 30], [60, 30, 114], [114, 30, 31], [114, 31, 115], [62, 60, 114], [62, 114, 116], [116, 114, 115], [116, 115, 117], [73, 62, 116], [73, 116, 120], [122, 45, 48], [122, 48, 126], [124, 122, 126], [124, 126, 127], [128, 51, 52], [128, 52, 129], [132, 123, 124], [132, 124, 133], [133, 124, 127], [133, 127, 139], [143, 141, 89], [143, 89, 91], [148, 146, 144], [148, 144, 147], [159, 150, 148], [159, 148, 152], [162, 155, 107], [162, 107, 110], [163, 156, 155], [163, 155, 162], [164, 162, 110], [164, 110, 112], [166, 163, 162], [166, 162, 164], [169, 168, 163], [169, 163, 166], [171, 98, 97], [171, 97, 170], [177, 105, 101], [177, 101, 174], [180, 177, 174], [180, 174, 175], [181, 179, 177], [181, 177, 180], [184, 176, 173], [184, 173, 182], [185, 178, 176], [185, 176, 184], [191, 112, 111], [191, 111, 190], [201, 160, 158], [201, 158, 200], [203, 161, 153], [203, 153, 197], [204, 203, 197], [204, 197, 199], [208, 198, 181], [208, 181, 189], [210, 199, 198], [210, 198, 208], [211, 164, 112], [211, 112, 191], [212, 166, 164], [212, 164, 211], [213, 211, 191], [213, 191, 193], [214, 212, 211], [214, 211, 213], [215, 202, 196], [215, 196, 206]]]





;
function cubemesh4() = [
   [
     [-10, -10, -10],
     [10, -10, -10],
     [10, 10, -10],
     [-10, 10, -10],
     [-10, -10, -10],
     [10, -10, -10],
     [10, -10, 10],
     [-10, -10, 10],
     [10, -10, -10],
     [10, 10, -10],
     [10, 10, 10],
     [10, -10, 10],
     [10, 10, -10],
     [-10, 10, -10],
     [-10, 10, 10],
     [10, 10, 10],
     [-10, 10, -10],
     [-10, -10, -10],
     [-10, -10, 10],
     [-10, 10, 10],
     [-10, -10, 10],
     [10, -10, 10],
     [10, 10, 10],
     [-10, 10, 10]
   ],
   [
     [0, 1, 2, 3],
     [7, 6, 5, 4],
     [11, 10, 9, 8],
     [15, 14, 13, 12],
     [19, 18, 17, 16],
    [23, 22, 21, 20]

//,
//     [0, 1, 2],
//     [0,  2, 3]
//,
//     [7, 6, 5],
//     [7,  5, 4],
//     [11, 10, 9],
//     [11, , 9, 8],
//     [15, 14, 13],
//     [15,  13, 12],
//     [19, 18, 17],
//     [19,  17, 16]
//,
//    [23, 22, 21],
//    [23,  21, 20]
 
   ]
 ];
function cubemesh3() = [
   [
     [-10, -10, -10],
     [10, -10, -10],
     [10, 10, -10],
     [-10, 10, -10],
     [-10, -10, -10],
     [10, -10, -10],
     [10, -10, 10],
     [-10, -10, 10],
     [10, -10, -10],
     [10, 10, -10],
     [10, 10, 10],
     [10, -10, 10],
     [10, 10, -10],
     [-10, 10, -10],
     [-10, 10, 10],
     [10, 10, 10],
     [-10, 10, -10],
     [-10, -10, -10],
     [-10, -10, 10],
     [-10, 10, 10],
     [-10, -10, 10],
     [10, -10, 10],
     [10, 10, 10],
     [-10, 10, 10]
   ],
   [
//     [0, 1, 2, 3],
//     [7, 6, 5, 4],
//     [11, 10, 9, 8],
//     [15, 14, 13, 12],
//     [19, 18, 17, 16],
//    [23, 22, 21, 20]

 
     [0, 1, 2],
     [0,  2, 3]
,
     [7, 6, 5],
     [7,  5, 4],
     [11, 10, 9],
     [11, , 9, 8],
     [15, 14, 13],
     [15,  13, 12],
     [19, 18, 17],
     [19,  17, 16]
,
    [23, 22, 21],
    [23,  21, 20]
 
   ]
 ];
